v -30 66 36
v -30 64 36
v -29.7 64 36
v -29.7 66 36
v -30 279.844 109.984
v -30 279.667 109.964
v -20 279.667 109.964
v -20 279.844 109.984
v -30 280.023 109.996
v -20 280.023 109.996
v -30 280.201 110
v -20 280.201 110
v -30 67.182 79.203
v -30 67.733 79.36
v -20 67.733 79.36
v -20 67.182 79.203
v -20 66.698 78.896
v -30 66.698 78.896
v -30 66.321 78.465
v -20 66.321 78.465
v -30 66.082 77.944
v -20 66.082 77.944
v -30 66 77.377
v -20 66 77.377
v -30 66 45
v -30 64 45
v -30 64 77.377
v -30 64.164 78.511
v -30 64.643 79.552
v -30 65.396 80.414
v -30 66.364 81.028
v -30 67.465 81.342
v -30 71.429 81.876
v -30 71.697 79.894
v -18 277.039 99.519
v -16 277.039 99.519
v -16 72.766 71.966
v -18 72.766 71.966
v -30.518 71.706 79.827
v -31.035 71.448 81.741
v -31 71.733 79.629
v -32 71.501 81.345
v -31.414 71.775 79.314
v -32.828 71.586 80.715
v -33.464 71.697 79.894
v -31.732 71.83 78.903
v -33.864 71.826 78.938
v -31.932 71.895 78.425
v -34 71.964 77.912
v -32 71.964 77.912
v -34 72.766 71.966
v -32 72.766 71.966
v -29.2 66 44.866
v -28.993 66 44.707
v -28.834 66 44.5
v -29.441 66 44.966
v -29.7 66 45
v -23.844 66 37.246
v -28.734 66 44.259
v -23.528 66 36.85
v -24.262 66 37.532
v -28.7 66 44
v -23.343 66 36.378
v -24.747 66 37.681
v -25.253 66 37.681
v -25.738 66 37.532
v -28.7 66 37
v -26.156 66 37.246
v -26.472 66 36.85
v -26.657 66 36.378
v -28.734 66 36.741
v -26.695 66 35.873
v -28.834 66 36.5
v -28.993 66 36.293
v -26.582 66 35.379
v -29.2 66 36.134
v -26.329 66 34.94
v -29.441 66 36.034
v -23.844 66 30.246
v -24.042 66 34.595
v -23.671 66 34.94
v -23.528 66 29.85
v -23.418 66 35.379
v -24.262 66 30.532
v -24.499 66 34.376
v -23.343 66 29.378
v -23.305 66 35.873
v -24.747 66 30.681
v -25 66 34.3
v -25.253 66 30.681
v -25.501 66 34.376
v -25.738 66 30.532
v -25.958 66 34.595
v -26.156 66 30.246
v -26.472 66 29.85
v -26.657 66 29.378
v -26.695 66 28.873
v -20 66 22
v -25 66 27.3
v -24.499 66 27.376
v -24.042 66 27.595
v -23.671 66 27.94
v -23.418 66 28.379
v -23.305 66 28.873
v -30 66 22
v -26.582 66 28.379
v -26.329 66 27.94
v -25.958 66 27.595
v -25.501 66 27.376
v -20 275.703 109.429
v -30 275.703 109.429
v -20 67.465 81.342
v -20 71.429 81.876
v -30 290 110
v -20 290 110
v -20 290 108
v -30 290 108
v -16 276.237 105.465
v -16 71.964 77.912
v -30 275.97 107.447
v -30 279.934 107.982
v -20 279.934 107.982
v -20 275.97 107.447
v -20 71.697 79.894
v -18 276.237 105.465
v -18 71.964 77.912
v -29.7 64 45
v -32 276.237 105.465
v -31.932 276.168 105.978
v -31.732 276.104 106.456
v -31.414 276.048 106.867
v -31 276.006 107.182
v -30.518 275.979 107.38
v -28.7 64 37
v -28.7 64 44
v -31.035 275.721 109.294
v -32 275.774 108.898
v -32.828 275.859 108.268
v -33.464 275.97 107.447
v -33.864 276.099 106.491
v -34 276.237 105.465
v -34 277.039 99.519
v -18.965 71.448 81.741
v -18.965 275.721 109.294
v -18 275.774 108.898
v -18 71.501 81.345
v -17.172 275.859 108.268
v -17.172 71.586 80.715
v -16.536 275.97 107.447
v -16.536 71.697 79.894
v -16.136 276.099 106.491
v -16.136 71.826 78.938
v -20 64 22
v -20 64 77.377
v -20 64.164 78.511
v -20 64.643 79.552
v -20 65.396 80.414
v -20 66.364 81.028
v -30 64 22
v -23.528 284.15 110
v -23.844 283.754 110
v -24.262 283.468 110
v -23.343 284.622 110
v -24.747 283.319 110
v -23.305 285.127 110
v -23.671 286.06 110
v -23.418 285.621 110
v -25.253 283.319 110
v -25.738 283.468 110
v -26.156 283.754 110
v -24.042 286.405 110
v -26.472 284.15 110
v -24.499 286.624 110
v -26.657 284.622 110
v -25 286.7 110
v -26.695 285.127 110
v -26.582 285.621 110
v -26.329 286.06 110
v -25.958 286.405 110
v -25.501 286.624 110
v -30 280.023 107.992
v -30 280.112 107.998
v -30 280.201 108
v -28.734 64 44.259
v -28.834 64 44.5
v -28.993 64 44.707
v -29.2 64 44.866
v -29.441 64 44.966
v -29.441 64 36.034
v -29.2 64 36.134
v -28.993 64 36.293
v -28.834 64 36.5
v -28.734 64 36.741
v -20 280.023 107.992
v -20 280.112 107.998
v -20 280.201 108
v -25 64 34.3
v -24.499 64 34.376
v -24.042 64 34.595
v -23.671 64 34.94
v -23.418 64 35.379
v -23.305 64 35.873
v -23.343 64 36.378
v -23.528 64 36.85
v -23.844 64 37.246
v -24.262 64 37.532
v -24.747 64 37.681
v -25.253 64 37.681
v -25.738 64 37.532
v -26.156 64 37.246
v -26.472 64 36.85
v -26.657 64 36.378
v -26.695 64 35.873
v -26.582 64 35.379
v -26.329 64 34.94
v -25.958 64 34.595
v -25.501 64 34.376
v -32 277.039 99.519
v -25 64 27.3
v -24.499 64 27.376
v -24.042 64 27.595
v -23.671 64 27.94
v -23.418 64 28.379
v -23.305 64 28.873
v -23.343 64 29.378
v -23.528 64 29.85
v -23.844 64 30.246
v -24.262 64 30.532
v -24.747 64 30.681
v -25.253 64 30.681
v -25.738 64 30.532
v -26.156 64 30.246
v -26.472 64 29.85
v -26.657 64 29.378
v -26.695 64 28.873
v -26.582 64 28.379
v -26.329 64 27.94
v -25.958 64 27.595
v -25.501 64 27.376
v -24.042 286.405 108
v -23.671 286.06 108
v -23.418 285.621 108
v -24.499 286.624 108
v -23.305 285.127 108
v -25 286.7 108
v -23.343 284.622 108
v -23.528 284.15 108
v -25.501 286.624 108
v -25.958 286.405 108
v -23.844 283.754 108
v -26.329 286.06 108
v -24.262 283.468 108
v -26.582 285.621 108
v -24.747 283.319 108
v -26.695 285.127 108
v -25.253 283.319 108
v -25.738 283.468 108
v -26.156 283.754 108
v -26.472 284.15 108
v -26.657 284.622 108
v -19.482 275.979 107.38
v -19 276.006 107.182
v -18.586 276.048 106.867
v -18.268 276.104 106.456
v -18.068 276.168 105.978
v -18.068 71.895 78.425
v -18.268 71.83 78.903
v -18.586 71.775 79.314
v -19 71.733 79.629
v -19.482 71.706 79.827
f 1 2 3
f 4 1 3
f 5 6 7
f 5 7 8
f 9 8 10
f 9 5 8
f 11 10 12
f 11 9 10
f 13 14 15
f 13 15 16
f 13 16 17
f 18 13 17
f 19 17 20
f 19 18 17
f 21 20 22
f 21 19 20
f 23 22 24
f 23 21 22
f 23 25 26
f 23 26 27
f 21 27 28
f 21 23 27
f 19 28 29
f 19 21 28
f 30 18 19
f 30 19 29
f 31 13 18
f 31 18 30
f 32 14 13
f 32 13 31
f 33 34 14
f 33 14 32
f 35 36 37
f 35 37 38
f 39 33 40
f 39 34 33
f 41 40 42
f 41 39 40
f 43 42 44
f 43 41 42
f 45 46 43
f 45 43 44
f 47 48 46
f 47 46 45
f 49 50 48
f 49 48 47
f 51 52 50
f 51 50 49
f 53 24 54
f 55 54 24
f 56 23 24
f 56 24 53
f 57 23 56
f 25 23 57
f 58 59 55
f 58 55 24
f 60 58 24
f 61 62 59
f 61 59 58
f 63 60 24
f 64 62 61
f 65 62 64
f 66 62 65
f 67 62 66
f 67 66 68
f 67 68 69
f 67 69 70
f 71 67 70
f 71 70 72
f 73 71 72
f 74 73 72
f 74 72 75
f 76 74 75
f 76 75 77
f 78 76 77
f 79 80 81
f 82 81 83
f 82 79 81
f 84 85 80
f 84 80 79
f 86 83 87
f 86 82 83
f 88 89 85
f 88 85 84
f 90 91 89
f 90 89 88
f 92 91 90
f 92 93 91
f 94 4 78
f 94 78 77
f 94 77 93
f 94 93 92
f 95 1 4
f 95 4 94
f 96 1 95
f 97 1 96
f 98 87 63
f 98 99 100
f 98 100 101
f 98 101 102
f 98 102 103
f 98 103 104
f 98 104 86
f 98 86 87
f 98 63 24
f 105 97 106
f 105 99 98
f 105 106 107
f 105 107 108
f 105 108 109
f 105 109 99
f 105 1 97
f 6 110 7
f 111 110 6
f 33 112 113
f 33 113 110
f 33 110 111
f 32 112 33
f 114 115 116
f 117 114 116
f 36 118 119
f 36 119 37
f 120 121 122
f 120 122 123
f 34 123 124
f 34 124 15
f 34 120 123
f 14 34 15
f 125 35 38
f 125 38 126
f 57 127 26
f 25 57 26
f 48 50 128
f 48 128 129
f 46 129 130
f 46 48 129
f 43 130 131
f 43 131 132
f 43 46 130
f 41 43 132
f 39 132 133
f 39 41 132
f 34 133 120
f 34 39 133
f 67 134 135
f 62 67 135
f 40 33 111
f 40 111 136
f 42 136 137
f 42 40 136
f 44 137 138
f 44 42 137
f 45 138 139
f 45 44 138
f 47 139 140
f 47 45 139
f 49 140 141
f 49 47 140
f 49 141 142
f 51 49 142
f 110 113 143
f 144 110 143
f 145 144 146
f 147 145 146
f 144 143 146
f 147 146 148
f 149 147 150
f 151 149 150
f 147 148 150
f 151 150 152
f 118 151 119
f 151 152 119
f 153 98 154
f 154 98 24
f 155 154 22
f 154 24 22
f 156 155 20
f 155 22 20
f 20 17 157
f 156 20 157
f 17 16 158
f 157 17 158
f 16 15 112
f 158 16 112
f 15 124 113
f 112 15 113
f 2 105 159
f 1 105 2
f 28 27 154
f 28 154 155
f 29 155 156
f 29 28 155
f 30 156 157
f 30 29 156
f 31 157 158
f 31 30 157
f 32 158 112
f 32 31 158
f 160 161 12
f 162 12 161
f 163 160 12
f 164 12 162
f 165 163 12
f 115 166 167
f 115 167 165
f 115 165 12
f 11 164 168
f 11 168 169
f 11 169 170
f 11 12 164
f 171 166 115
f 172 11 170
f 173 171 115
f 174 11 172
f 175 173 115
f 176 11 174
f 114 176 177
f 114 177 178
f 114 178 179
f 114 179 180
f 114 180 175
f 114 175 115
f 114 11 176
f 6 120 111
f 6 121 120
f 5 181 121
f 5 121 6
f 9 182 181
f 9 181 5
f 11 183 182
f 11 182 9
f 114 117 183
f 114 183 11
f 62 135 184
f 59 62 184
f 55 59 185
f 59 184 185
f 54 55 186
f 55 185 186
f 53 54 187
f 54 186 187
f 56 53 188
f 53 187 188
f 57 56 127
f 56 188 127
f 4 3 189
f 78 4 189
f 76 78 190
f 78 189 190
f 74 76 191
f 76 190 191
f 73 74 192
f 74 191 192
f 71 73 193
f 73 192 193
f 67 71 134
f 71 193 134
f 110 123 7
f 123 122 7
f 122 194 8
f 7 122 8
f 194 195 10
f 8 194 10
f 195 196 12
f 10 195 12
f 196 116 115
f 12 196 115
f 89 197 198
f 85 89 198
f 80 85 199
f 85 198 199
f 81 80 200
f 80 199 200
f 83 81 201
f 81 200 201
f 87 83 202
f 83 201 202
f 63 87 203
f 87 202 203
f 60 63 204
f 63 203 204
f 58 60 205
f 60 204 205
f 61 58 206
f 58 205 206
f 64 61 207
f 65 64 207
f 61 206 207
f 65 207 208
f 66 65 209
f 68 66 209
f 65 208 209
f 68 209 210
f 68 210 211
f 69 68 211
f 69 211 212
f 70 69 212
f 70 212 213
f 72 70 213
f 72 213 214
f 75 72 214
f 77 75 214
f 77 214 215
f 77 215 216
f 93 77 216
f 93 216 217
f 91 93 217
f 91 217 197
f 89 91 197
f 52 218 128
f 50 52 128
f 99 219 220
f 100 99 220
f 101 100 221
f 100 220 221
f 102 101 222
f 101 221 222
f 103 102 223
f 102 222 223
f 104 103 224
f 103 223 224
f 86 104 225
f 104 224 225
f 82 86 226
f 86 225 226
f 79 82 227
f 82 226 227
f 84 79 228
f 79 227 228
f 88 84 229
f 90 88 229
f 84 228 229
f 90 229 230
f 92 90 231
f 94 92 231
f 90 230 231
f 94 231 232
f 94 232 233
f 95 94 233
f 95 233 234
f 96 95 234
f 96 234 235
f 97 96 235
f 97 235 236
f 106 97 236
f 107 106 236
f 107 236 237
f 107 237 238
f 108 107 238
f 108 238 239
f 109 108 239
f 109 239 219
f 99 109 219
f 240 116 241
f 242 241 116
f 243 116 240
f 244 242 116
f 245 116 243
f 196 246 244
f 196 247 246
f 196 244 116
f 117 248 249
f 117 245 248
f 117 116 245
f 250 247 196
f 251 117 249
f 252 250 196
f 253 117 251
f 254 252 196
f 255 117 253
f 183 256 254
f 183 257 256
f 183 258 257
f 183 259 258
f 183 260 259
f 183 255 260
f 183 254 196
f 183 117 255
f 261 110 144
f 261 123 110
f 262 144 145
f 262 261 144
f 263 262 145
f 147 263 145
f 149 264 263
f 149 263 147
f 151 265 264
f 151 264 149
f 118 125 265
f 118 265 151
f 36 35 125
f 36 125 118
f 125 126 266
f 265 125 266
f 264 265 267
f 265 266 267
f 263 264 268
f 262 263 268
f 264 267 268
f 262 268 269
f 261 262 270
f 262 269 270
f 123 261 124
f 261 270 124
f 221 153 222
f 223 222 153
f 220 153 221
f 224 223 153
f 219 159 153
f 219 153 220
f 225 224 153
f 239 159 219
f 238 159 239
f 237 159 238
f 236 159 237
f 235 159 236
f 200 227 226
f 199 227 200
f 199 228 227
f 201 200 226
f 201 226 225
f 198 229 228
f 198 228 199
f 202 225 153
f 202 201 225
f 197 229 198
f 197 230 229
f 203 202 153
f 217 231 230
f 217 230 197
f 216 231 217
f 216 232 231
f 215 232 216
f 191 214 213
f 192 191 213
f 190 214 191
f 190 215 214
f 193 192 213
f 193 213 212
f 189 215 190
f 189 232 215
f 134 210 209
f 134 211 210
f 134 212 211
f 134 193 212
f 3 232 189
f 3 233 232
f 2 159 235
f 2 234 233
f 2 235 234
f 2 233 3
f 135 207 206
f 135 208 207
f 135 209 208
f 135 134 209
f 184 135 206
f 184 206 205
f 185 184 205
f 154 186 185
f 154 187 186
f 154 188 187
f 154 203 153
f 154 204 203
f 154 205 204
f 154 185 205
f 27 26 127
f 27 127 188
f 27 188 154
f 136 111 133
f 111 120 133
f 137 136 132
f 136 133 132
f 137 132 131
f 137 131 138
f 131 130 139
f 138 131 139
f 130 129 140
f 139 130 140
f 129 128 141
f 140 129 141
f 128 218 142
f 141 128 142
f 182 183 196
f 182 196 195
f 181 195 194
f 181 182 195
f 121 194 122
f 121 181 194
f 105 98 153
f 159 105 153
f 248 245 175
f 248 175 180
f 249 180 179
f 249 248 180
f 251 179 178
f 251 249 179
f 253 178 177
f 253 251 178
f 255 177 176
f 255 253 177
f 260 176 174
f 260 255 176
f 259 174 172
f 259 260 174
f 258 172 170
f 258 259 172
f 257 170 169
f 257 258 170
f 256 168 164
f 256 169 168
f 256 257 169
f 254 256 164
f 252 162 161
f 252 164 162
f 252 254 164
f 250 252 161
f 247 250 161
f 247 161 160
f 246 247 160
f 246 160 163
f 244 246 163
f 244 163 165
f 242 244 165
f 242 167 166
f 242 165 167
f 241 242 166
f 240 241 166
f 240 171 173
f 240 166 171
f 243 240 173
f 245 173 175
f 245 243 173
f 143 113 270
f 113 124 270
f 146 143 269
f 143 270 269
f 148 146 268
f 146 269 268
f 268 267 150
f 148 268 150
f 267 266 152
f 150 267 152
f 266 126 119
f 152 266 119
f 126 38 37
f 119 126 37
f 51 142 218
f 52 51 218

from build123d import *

# Parameters (mm, degrees)
FORMED_WEB_DEPTH           = 10
EDGE_STIFFENING_LIPS_DEPTH = 206.123068282
WALL_MOUNT_HOLE_SKETCH_R   = 1.7
WALL_MOUNT_HOLES_DEPTH     = 2.4
COVER_MOUNT_HOLE_SKETCH_R  = 1.7
COVER_MOUNT_HOLE_DEPTH     = 2.4
FRAME_MOUNT_RELIEF_DEPTH   = 2.4


with BuildPart() as part:
    # Formed Web Section Sketch → Formed Web (new body)
    with BuildSketch(Plane(origin=(-30, 0, 0), x_dir=(0, 0, -1), z_dir=(1, 0, 0))):
        with BuildLine():
            Line((-22, 64), (-77.377483747, 64))
            ThreePointArc((-77.377483747, 64), (-80.010089753, 64.988457933), (-81.341585612, 67.46530719))
            Line((-81.341585612, 67.46530719), (-109.964101865, 279.66672079))
            ThreePointArc((-109.964101865, 279.66672079), (-109.991015376, 279.933465342), (-110, 280.2014136))
            Line((-110, 280.2014136), (-110, 290))
            Line((-110, 290), (-108, 290))
            Line((-108, 290), (-108, 280.2014136))
            ThreePointArc((-108, 280.2014136), (-107.995507688, 280.067439471), (-107.982050933, 279.934067195))
            Line((-107.982050933, 279.934067195), (-79.35953468, 67.732653595))
            ThreePointArc((-79.35953468, 67.732653595), (-78.69378675, 66.494228967), (-77.377483747, 66))
            Line((-77.377483747, 66), (-22, 66))
            Line((-22, 66), (-22, 64))
        make_face()
    extrude(amount=FORMED_WEB_DEPTH)

    # Edge Lip Sketch → Edge Stiffening Lips (add)
    with BuildSketch(Plane(origin=(0, 80.999511953, 10.925515566), x_dir=(-1, 0, 0), z_dir=(0, -0.9910254663478989, -0.1336732024376229))):
        with BuildLine():
            Line((34, -67.593279149), (34, -61.593279149))
            Line((34, -61.593279149), (32, -61.593279149))
            Line((32, -61.593279149), (32, -67.593279149))
            ThreePointArc((32, -67.593279149), (31.414213562, -69.007492712), (30, -69.593279149))
            Line((30, -69.593279149), (29.9, -69.593279149))
            Line((29.9, -69.593279149), (29.9, -71.593279149))
            Line((29.9, -71.593279149), (30, -71.593279149))
            ThreePointArc((30, -71.593279149), (32.828427125, -70.421706274), (34, -67.593279149))
        make_face()
        with BuildLine():
            Line((16, -67.593279149), (16, -61.593279149))
            Line((16, -61.593279149), (18, -61.593279149))
            Line((18, -61.593279149), (18, -67.593279149))
            ThreePointArc((18, -67.593279149), (18.585786438, -69.007492712), (20, -69.593279149))
            Line((20, -69.593279149), (20.1, -69.593279149))
            Line((20.1, -69.593279149), (20.1, -71.593279149))
            Line((20.1, -71.593279149), (20, -71.593279149))
            ThreePointArc((20, -71.593279149), (17.171572875, -70.421706274), (16, -67.593279149))
        make_face()
    extrude(amount=-EDGE_STIFFENING_LIPS_DEPTH)

    # Wall Mount Hole Sketch → Wall Mount Holes (cut)
    with BuildSketch(Plane(origin=(0, 63.8, 0), x_dir=(-1, 0, 0), z_dir=(0, -1, 0))):
        with Locations(Location((25, -29, 0), (0, 0, 90))):
            Circle(WALL_MOUNT_HOLE_SKETCH_R)
        with Locations(Location((25, -36, 0), (0, 0, 90))):
            Circle(WALL_MOUNT_HOLE_SKETCH_R)
    extrude(amount=-WALL_MOUNT_HOLES_DEPTH, mode=Mode.SUBTRACT)

    # Cover Mount Hole Sketch → Cover Mount Hole (cut)
    with BuildSketch(Plane.XY.offset(107.8)):
        with Locations(Location((-25, 285, 0), (0, 0, 90))):
            Circle(COVER_MOUNT_HOLE_SKETCH_R)
    extrude(amount=COVER_MOUNT_HOLE_DEPTH, mode=Mode.SUBTRACT)

    # Frame Mount Relief Sketch → Frame Mount Relief (cut)
    with BuildSketch(Plane(origin=(0, 63.8, 0), x_dir=(-1, 0, 0), z_dir=(0, -1, 0))):
        with BuildLine():
            Line((30, -36), (29.7, -36))
            ThreePointArc((29.7, -36), (28.992893219, -36.292893219), (28.7, -37))
            Line((28.7, -37), (28.7, -44))
            ThreePointArc((28.7, -44), (28.992893219, -44.707106781), (29.7, -45))
            Line((29.7, -45), (30, -45))
            ThreePointArc((30, -45), (30.707106781, -44.707106781), (31, -44))
            Line((31, -44), (31, -37))
            ThreePointArc((31, -37), (30.707106781, -36.292893219), (30, -36))
        make_face()
    extrude(amount=-FRAME_MOUNT_RELIEF_DEPTH, mode=Mode.SUBTRACT)


solid = part.part
